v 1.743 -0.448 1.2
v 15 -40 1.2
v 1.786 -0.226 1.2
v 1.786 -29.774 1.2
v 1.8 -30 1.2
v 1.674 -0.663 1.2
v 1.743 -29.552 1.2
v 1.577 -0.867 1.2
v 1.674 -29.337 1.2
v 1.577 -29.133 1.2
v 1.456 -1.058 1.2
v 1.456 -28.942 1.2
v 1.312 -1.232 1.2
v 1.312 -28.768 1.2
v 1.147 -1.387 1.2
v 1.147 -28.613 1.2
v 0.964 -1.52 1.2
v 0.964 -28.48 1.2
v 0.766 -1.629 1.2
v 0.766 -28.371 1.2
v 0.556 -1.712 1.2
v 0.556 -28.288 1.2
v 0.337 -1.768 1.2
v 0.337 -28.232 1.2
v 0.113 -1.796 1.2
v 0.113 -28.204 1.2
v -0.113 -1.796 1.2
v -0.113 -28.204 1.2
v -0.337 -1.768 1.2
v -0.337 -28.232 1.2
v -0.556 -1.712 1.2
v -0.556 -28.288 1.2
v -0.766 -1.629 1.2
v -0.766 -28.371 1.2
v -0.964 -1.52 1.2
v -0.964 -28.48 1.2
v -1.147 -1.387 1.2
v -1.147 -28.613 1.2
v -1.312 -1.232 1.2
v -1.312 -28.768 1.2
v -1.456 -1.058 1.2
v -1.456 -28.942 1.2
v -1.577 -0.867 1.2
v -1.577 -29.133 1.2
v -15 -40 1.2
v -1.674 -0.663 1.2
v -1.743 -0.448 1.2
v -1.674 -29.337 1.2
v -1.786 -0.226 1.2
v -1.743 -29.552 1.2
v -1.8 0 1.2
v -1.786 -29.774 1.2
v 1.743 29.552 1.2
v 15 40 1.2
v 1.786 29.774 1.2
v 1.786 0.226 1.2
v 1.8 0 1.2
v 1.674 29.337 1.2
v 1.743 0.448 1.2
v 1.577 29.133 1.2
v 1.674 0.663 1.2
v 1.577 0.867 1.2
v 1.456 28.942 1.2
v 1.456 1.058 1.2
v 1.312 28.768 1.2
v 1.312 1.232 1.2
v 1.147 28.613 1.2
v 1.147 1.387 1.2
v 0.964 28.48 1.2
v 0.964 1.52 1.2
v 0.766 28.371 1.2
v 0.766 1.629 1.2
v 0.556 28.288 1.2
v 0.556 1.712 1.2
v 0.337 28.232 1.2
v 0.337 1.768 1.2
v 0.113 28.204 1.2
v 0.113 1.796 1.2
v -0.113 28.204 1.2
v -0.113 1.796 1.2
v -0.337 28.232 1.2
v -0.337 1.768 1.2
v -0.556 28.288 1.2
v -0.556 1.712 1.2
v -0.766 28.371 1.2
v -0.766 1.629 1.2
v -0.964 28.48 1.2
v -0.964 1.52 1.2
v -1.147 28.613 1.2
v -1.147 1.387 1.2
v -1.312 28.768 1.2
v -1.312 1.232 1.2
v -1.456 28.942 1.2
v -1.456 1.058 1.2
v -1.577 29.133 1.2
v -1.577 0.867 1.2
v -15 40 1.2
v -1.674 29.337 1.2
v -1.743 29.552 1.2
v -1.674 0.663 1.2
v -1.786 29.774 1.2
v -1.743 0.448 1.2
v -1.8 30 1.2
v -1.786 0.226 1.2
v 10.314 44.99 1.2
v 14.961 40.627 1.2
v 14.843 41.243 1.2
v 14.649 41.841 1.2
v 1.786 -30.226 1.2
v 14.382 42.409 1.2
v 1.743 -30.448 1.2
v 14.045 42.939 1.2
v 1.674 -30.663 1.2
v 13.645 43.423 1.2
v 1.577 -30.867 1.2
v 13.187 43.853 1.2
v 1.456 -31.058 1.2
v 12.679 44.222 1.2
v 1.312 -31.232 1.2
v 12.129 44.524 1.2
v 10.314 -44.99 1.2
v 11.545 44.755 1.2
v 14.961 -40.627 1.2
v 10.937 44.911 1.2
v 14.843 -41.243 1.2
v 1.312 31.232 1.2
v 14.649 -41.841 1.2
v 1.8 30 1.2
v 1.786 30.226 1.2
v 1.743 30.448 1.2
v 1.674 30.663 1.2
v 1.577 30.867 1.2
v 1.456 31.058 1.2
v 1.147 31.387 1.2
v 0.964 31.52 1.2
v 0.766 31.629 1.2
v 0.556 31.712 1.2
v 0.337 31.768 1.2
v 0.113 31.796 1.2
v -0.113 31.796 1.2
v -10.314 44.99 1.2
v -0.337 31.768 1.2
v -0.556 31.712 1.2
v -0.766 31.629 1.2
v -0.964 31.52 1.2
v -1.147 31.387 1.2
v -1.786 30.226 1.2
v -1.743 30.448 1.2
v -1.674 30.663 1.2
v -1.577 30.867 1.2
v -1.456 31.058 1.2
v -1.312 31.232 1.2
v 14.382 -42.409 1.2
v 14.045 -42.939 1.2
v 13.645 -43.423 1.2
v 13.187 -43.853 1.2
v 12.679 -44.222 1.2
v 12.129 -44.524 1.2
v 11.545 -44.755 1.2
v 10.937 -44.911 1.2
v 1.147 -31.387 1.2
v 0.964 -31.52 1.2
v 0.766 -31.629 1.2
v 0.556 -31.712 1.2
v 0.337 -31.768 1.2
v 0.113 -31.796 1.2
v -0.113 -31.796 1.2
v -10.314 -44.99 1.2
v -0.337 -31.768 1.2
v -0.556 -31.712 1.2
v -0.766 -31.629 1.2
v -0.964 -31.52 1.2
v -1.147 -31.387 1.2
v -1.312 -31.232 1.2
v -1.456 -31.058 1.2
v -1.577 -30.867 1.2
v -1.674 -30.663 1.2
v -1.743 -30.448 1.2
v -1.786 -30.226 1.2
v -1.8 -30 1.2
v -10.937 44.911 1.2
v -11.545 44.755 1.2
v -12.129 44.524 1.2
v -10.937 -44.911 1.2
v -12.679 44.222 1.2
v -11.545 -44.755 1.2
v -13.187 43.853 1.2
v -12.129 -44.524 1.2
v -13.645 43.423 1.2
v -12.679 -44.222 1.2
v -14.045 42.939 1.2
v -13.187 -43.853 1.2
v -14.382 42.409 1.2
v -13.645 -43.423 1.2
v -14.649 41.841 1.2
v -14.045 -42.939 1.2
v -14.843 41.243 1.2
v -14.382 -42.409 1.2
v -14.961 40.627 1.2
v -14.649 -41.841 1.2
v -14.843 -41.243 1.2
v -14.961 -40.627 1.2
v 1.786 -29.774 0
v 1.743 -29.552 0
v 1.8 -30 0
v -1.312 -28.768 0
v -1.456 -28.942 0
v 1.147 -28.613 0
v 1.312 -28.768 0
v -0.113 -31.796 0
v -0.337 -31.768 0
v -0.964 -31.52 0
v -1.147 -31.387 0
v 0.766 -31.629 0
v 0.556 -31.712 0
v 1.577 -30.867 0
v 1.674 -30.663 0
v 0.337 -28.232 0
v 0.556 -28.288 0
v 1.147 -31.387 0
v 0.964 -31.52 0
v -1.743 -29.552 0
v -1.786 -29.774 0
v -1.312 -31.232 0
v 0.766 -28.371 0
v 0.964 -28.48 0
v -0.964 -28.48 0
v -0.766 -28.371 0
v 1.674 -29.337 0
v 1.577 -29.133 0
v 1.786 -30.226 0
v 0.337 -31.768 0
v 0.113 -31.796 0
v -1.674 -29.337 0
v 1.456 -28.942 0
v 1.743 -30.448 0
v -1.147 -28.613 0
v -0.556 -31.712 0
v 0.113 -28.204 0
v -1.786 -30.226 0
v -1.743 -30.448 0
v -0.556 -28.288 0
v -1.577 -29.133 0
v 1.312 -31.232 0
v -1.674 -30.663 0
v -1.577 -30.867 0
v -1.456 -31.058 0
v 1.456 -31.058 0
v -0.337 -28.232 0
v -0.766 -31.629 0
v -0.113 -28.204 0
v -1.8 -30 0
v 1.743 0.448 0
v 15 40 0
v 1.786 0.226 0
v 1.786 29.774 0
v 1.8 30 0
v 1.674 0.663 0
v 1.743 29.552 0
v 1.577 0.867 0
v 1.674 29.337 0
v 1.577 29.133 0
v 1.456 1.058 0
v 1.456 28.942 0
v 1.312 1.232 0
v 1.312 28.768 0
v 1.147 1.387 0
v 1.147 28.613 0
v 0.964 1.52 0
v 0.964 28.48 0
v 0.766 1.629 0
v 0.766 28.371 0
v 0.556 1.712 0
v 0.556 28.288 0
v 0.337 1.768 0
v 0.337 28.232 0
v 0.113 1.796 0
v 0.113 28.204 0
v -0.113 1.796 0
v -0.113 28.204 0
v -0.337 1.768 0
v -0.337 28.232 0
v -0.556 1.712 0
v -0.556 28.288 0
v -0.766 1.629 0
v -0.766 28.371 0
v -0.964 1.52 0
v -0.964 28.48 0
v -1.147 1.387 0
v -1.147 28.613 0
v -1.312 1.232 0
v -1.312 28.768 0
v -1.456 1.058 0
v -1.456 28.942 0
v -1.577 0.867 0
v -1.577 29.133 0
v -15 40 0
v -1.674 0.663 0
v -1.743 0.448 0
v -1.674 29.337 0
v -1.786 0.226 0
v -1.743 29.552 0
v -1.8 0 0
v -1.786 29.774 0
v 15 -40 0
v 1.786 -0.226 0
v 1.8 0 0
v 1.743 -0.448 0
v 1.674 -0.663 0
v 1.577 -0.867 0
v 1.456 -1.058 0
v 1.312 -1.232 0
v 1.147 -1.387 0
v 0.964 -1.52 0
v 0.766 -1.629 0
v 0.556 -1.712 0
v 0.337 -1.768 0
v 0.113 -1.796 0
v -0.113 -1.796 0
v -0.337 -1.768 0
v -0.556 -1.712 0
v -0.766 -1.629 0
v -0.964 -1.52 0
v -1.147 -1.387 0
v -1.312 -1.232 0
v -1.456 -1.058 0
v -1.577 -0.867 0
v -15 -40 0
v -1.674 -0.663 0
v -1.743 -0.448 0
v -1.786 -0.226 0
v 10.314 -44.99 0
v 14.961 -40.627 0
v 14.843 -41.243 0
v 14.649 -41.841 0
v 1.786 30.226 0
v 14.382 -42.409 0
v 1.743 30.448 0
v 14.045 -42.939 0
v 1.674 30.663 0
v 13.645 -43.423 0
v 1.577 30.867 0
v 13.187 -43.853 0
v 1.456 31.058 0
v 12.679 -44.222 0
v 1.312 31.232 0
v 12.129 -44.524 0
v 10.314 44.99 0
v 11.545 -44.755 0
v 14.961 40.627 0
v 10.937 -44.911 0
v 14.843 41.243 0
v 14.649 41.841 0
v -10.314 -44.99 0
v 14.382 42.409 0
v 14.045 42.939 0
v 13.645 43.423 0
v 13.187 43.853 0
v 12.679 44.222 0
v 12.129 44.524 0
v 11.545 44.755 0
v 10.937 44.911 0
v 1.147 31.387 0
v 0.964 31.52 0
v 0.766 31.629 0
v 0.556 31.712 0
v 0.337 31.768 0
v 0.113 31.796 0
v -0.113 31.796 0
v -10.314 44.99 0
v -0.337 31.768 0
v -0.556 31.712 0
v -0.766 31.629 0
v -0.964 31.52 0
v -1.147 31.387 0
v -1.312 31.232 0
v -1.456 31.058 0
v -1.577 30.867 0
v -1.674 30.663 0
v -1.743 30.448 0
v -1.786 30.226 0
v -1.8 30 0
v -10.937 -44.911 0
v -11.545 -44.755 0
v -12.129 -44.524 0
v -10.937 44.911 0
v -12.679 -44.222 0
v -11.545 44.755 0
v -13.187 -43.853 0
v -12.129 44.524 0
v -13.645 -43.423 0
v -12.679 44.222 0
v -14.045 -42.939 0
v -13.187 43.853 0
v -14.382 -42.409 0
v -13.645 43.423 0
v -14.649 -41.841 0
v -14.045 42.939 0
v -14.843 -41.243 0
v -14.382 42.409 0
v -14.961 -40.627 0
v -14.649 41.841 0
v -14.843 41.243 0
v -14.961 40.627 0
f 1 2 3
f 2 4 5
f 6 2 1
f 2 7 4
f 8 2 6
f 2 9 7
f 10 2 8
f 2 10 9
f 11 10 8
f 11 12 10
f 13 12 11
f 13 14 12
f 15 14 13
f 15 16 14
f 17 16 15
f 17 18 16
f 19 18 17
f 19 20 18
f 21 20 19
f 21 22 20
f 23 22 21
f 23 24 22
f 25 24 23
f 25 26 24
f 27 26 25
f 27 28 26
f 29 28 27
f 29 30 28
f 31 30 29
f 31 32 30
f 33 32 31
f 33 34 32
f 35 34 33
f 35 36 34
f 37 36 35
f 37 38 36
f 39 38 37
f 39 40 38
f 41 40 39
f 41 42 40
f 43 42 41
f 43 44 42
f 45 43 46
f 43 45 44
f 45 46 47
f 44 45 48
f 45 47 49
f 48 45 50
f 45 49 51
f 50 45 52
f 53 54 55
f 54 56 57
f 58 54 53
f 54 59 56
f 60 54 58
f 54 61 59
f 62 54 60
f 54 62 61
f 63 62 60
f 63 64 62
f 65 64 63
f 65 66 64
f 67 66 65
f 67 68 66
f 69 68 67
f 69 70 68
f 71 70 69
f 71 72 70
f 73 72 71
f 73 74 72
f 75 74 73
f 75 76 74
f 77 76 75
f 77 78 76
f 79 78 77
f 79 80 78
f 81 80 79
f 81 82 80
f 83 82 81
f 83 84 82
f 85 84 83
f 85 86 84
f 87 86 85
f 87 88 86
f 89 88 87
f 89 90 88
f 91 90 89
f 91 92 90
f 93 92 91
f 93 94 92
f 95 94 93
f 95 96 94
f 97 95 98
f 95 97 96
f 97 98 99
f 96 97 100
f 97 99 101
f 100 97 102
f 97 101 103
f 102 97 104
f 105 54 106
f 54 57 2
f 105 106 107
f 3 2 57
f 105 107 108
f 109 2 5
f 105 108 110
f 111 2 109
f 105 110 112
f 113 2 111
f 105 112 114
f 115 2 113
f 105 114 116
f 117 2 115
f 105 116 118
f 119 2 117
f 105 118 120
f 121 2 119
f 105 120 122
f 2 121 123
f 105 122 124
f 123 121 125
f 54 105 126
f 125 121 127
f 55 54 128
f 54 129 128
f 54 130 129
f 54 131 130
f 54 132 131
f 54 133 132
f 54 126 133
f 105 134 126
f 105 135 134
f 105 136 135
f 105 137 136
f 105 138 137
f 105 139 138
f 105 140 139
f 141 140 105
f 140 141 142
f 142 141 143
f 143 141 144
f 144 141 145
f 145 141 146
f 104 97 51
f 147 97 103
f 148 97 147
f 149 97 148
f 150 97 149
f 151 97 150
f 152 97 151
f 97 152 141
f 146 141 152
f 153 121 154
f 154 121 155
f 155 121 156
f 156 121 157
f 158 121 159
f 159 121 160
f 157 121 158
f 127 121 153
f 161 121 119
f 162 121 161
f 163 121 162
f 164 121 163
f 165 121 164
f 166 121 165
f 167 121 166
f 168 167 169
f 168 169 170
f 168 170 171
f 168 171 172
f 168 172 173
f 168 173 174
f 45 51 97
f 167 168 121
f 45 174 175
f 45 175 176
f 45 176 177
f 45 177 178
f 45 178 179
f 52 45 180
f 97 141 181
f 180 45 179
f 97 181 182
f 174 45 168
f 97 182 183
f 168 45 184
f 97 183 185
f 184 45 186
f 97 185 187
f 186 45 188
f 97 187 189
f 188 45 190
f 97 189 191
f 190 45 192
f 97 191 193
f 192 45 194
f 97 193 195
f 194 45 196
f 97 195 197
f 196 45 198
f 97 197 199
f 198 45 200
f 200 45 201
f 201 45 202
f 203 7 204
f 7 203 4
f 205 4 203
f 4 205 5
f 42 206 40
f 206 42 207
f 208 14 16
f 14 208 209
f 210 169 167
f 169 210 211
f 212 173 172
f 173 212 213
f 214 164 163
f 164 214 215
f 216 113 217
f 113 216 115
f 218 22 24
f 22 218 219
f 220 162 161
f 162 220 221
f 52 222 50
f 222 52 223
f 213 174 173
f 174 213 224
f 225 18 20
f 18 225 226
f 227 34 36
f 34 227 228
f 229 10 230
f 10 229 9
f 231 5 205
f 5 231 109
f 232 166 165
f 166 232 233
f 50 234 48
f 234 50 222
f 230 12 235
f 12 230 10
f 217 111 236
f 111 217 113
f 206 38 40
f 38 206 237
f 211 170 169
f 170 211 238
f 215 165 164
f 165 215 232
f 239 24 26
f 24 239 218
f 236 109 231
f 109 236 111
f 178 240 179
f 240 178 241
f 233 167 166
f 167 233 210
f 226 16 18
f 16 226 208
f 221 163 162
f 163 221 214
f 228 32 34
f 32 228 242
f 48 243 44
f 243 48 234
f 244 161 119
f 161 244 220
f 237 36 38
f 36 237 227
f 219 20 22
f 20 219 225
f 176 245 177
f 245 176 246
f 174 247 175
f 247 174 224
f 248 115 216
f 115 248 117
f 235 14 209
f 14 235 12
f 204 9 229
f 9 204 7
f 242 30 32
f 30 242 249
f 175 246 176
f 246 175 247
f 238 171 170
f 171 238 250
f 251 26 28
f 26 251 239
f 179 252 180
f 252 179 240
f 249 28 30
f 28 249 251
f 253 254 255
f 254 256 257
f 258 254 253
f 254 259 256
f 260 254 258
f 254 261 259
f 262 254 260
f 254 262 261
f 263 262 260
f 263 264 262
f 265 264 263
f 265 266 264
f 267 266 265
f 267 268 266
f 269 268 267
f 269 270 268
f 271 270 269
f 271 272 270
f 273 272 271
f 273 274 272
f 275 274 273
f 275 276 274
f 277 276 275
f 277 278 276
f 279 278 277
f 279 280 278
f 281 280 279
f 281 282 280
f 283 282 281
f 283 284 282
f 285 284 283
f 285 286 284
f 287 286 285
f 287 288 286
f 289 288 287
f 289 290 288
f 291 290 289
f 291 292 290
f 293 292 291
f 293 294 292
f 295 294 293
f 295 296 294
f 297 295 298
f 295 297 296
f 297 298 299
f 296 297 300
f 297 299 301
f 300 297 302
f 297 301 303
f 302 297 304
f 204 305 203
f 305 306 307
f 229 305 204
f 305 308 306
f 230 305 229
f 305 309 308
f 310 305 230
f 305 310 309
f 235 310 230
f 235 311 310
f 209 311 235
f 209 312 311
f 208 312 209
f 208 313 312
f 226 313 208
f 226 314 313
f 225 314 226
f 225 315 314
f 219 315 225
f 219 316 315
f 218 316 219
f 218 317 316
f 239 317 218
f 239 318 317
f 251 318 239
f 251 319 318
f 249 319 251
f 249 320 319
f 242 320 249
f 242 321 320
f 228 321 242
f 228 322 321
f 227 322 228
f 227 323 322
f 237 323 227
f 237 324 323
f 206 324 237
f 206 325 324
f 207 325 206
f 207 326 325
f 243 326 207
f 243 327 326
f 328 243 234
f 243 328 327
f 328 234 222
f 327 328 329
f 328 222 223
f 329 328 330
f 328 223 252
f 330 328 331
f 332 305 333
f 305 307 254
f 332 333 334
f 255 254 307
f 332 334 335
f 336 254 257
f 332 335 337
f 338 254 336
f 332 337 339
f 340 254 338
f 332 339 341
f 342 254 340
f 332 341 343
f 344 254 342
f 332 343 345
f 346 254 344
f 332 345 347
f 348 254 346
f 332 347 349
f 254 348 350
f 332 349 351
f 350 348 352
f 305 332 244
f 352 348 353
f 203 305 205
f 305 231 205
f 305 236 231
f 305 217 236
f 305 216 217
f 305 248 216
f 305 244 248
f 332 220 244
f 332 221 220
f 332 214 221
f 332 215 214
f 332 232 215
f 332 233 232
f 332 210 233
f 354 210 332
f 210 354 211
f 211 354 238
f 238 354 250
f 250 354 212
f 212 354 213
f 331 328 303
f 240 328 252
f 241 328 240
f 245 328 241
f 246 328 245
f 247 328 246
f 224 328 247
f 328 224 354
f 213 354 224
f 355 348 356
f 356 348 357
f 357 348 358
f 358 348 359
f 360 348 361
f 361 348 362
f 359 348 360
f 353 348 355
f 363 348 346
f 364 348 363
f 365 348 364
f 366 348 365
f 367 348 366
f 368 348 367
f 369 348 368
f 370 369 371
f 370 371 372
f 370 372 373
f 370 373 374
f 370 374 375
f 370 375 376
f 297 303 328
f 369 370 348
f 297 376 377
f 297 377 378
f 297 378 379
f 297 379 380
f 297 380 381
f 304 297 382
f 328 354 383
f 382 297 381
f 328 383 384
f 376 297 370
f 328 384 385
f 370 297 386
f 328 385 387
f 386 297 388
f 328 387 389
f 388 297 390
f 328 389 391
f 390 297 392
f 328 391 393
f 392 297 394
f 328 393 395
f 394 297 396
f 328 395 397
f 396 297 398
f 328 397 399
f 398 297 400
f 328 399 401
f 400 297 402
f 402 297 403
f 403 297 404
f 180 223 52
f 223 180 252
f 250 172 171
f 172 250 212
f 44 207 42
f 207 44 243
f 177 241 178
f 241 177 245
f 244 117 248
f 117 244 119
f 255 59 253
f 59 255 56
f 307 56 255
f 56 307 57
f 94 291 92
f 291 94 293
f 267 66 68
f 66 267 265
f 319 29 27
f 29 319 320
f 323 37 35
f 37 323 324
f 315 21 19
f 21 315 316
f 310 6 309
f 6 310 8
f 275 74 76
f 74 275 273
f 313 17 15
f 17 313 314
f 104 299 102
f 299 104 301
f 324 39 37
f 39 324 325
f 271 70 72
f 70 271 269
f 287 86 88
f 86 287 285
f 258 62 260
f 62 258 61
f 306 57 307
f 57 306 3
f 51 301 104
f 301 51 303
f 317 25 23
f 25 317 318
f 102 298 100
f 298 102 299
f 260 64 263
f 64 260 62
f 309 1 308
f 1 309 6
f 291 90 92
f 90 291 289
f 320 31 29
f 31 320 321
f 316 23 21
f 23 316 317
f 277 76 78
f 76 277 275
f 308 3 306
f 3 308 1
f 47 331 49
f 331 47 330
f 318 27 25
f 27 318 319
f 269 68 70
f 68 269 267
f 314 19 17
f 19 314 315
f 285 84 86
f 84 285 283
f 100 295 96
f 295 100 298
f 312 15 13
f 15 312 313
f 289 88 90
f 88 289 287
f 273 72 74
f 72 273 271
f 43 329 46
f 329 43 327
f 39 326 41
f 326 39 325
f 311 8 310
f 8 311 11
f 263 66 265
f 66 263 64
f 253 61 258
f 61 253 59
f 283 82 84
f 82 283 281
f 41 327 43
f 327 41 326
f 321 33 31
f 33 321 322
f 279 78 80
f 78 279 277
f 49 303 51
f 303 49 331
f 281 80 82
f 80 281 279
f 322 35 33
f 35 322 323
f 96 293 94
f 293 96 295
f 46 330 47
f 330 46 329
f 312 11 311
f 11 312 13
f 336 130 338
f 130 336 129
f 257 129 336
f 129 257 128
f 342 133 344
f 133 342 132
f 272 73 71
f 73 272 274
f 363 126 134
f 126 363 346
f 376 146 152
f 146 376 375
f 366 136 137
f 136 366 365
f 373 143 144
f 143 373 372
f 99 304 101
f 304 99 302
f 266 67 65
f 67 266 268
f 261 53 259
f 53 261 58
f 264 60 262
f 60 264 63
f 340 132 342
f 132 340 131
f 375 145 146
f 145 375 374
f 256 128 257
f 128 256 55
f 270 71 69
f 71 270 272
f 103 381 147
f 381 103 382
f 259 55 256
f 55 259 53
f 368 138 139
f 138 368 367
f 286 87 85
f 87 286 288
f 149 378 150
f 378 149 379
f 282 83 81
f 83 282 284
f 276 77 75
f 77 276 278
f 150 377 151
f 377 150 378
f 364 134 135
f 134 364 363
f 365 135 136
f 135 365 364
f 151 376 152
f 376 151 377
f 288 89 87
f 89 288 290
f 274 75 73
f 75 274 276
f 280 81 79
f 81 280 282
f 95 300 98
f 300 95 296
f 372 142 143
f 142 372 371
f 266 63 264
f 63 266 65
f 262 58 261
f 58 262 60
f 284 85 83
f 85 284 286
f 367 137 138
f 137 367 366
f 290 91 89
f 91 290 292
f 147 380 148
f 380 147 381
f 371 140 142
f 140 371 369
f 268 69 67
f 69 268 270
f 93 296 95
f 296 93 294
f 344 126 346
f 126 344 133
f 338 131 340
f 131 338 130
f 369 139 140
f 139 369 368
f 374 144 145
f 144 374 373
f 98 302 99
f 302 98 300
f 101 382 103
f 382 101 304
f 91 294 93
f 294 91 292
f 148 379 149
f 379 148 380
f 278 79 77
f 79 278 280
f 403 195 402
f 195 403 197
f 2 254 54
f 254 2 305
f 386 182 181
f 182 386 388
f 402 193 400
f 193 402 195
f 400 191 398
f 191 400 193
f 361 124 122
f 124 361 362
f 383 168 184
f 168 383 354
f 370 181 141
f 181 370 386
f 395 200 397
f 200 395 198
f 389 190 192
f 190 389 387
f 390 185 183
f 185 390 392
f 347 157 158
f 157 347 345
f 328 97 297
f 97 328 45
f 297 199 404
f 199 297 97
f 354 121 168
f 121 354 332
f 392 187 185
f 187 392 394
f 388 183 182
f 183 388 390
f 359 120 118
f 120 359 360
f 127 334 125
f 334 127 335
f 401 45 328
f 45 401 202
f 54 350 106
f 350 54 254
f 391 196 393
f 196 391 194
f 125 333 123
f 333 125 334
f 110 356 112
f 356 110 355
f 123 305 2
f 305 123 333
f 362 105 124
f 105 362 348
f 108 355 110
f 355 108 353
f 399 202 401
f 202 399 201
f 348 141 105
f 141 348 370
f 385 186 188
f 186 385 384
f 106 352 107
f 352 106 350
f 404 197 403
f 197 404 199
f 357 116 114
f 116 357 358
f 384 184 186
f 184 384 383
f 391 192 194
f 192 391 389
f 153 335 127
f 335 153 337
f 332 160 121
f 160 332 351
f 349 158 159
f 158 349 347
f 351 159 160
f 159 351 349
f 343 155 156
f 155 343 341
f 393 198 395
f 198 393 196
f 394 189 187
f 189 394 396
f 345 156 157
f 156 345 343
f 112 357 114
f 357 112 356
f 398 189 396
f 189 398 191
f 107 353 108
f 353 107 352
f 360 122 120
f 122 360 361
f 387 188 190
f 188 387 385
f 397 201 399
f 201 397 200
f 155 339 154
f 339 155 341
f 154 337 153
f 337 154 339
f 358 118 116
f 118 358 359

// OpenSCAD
$fn = 50;


difference() {
	union() {
		hull() {
			translate(v = [-10.0000000000, 40.0000000000, 0]) {
				cylinder(h = 90, r = 5);
			}
			translate(v = [10.0000000000, 40.0000000000, 0]) {
				cylinder(h = 90, r = 5);
			}
			translate(v = [-10.0000000000, -40.0000000000, 0]) {
				cylinder(h = 90, r = 5);
			}
			translate(v = [10.0000000000, -40.0000000000, 0]) {
				cylinder(h = 90, r = 5);
			}
		}
	}
	union() {
		translate(v = [0, 0, 1.2000000000]) {
			hull() {
				translate(v = [-10.0000000000, 40.0000000000, 0]) {
					cylinder(h = 88.8000000000, r = 3.8000000000);
				}
				translate(v = [10.0000000000, 40.0000000000, 0]) {
					cylinder(h = 88.8000000000, r = 3.8000000000);
				}
				translate(v = [-10.0000000000, -40.0000000000, 0]) {
					cylinder(h = 88.8000000000, r = 3.8000000000);
				}
				translate(v = [10.0000000000, -40.0000000000, 0]) {
					cylinder(h = 88.8000000000, r = 3.8000000000);
				}
			}
		}
		#translate(v = [0.0000000000, -30.0000000000, 0]) {
			cylinder(h = 1.2000000000, r = 1.8000000000);
		}
		#cylinder(h = 1.2000000000, r = 1.8000000000);
		#translate(v = [0.0000000000, 30.0000000000, 0]) {
			cylinder(h = 1.2000000000, r = 1.8000000000);
		}
		translate(v = [-250.0000000000, -250.0000000000, 1.2000000000]) {
			cube(size = [500, 500, 500]);
		}
		translate(v = [-250.0000000000, -250.0000000000, 1.2000000000]) {
			cube(size = [500, 500, 500]);
		}
		translate(v = [-250.0000000000, -250.0000000000, 1.2000000000]) {
			cube(size = [500, 500, 500]);
		}
	}
}
